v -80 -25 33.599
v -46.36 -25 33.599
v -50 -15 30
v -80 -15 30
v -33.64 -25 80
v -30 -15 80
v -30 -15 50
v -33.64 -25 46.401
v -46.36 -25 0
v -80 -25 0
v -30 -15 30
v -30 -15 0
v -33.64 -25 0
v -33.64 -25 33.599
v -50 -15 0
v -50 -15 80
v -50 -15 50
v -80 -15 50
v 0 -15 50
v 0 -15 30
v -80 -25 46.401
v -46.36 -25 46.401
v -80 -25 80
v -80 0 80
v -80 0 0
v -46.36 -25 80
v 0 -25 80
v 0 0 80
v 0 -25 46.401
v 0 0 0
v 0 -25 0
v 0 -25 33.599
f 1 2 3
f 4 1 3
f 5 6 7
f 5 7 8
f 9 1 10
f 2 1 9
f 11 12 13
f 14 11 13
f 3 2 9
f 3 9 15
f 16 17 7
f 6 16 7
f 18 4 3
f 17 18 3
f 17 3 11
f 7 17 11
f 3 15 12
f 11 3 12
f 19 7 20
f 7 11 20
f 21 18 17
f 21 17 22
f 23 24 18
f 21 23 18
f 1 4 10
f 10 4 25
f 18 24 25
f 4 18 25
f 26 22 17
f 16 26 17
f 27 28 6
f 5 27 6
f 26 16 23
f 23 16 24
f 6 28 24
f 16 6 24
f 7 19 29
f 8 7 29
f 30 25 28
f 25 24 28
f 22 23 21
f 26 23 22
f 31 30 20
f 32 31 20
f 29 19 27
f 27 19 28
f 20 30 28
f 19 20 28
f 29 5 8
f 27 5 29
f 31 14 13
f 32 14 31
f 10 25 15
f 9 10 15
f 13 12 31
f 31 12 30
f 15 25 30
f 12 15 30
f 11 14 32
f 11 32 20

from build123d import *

# Parameters (mm, degrees)
F1_DEPTH = 25
F3_DEPTH = 80
F5_DEPTH = 80


with BuildPart() as f1:
    # F0 (on Front) → F1 (new body)
    with BuildSketch(Plane.XZ):
        Polygon((-80, 0), (0, 0), (0, 33.64), (0, 80), (-80, 80), align=None)
    extrude(amount=F1_DEPTH)

    # F2 (on face) → F3 (cut)
    with BuildSketch(Plane(origin=(0, 0, 0), x_dir=(1, 0, 0), z_dir=(0, 0, -1))):
        Polygon((-33.64, 25), (-46.36, 25), (-50, 15), (-30, 15), align=None)
    extrude(amount=-F3_DEPTH, mode=Mode.SUBTRACT)

    # F4 (on Right) → F5 (cut)
    with BuildSketch(Plane.YZ):
        Polygon((-25.113055, 33.64), (-15, 30), (-15, 50), (-25.113055, 46.36), align=None)
    extrude(amount=-F5_DEPTH, mode=Mode.SUBTRACT)


solid = f1.part
